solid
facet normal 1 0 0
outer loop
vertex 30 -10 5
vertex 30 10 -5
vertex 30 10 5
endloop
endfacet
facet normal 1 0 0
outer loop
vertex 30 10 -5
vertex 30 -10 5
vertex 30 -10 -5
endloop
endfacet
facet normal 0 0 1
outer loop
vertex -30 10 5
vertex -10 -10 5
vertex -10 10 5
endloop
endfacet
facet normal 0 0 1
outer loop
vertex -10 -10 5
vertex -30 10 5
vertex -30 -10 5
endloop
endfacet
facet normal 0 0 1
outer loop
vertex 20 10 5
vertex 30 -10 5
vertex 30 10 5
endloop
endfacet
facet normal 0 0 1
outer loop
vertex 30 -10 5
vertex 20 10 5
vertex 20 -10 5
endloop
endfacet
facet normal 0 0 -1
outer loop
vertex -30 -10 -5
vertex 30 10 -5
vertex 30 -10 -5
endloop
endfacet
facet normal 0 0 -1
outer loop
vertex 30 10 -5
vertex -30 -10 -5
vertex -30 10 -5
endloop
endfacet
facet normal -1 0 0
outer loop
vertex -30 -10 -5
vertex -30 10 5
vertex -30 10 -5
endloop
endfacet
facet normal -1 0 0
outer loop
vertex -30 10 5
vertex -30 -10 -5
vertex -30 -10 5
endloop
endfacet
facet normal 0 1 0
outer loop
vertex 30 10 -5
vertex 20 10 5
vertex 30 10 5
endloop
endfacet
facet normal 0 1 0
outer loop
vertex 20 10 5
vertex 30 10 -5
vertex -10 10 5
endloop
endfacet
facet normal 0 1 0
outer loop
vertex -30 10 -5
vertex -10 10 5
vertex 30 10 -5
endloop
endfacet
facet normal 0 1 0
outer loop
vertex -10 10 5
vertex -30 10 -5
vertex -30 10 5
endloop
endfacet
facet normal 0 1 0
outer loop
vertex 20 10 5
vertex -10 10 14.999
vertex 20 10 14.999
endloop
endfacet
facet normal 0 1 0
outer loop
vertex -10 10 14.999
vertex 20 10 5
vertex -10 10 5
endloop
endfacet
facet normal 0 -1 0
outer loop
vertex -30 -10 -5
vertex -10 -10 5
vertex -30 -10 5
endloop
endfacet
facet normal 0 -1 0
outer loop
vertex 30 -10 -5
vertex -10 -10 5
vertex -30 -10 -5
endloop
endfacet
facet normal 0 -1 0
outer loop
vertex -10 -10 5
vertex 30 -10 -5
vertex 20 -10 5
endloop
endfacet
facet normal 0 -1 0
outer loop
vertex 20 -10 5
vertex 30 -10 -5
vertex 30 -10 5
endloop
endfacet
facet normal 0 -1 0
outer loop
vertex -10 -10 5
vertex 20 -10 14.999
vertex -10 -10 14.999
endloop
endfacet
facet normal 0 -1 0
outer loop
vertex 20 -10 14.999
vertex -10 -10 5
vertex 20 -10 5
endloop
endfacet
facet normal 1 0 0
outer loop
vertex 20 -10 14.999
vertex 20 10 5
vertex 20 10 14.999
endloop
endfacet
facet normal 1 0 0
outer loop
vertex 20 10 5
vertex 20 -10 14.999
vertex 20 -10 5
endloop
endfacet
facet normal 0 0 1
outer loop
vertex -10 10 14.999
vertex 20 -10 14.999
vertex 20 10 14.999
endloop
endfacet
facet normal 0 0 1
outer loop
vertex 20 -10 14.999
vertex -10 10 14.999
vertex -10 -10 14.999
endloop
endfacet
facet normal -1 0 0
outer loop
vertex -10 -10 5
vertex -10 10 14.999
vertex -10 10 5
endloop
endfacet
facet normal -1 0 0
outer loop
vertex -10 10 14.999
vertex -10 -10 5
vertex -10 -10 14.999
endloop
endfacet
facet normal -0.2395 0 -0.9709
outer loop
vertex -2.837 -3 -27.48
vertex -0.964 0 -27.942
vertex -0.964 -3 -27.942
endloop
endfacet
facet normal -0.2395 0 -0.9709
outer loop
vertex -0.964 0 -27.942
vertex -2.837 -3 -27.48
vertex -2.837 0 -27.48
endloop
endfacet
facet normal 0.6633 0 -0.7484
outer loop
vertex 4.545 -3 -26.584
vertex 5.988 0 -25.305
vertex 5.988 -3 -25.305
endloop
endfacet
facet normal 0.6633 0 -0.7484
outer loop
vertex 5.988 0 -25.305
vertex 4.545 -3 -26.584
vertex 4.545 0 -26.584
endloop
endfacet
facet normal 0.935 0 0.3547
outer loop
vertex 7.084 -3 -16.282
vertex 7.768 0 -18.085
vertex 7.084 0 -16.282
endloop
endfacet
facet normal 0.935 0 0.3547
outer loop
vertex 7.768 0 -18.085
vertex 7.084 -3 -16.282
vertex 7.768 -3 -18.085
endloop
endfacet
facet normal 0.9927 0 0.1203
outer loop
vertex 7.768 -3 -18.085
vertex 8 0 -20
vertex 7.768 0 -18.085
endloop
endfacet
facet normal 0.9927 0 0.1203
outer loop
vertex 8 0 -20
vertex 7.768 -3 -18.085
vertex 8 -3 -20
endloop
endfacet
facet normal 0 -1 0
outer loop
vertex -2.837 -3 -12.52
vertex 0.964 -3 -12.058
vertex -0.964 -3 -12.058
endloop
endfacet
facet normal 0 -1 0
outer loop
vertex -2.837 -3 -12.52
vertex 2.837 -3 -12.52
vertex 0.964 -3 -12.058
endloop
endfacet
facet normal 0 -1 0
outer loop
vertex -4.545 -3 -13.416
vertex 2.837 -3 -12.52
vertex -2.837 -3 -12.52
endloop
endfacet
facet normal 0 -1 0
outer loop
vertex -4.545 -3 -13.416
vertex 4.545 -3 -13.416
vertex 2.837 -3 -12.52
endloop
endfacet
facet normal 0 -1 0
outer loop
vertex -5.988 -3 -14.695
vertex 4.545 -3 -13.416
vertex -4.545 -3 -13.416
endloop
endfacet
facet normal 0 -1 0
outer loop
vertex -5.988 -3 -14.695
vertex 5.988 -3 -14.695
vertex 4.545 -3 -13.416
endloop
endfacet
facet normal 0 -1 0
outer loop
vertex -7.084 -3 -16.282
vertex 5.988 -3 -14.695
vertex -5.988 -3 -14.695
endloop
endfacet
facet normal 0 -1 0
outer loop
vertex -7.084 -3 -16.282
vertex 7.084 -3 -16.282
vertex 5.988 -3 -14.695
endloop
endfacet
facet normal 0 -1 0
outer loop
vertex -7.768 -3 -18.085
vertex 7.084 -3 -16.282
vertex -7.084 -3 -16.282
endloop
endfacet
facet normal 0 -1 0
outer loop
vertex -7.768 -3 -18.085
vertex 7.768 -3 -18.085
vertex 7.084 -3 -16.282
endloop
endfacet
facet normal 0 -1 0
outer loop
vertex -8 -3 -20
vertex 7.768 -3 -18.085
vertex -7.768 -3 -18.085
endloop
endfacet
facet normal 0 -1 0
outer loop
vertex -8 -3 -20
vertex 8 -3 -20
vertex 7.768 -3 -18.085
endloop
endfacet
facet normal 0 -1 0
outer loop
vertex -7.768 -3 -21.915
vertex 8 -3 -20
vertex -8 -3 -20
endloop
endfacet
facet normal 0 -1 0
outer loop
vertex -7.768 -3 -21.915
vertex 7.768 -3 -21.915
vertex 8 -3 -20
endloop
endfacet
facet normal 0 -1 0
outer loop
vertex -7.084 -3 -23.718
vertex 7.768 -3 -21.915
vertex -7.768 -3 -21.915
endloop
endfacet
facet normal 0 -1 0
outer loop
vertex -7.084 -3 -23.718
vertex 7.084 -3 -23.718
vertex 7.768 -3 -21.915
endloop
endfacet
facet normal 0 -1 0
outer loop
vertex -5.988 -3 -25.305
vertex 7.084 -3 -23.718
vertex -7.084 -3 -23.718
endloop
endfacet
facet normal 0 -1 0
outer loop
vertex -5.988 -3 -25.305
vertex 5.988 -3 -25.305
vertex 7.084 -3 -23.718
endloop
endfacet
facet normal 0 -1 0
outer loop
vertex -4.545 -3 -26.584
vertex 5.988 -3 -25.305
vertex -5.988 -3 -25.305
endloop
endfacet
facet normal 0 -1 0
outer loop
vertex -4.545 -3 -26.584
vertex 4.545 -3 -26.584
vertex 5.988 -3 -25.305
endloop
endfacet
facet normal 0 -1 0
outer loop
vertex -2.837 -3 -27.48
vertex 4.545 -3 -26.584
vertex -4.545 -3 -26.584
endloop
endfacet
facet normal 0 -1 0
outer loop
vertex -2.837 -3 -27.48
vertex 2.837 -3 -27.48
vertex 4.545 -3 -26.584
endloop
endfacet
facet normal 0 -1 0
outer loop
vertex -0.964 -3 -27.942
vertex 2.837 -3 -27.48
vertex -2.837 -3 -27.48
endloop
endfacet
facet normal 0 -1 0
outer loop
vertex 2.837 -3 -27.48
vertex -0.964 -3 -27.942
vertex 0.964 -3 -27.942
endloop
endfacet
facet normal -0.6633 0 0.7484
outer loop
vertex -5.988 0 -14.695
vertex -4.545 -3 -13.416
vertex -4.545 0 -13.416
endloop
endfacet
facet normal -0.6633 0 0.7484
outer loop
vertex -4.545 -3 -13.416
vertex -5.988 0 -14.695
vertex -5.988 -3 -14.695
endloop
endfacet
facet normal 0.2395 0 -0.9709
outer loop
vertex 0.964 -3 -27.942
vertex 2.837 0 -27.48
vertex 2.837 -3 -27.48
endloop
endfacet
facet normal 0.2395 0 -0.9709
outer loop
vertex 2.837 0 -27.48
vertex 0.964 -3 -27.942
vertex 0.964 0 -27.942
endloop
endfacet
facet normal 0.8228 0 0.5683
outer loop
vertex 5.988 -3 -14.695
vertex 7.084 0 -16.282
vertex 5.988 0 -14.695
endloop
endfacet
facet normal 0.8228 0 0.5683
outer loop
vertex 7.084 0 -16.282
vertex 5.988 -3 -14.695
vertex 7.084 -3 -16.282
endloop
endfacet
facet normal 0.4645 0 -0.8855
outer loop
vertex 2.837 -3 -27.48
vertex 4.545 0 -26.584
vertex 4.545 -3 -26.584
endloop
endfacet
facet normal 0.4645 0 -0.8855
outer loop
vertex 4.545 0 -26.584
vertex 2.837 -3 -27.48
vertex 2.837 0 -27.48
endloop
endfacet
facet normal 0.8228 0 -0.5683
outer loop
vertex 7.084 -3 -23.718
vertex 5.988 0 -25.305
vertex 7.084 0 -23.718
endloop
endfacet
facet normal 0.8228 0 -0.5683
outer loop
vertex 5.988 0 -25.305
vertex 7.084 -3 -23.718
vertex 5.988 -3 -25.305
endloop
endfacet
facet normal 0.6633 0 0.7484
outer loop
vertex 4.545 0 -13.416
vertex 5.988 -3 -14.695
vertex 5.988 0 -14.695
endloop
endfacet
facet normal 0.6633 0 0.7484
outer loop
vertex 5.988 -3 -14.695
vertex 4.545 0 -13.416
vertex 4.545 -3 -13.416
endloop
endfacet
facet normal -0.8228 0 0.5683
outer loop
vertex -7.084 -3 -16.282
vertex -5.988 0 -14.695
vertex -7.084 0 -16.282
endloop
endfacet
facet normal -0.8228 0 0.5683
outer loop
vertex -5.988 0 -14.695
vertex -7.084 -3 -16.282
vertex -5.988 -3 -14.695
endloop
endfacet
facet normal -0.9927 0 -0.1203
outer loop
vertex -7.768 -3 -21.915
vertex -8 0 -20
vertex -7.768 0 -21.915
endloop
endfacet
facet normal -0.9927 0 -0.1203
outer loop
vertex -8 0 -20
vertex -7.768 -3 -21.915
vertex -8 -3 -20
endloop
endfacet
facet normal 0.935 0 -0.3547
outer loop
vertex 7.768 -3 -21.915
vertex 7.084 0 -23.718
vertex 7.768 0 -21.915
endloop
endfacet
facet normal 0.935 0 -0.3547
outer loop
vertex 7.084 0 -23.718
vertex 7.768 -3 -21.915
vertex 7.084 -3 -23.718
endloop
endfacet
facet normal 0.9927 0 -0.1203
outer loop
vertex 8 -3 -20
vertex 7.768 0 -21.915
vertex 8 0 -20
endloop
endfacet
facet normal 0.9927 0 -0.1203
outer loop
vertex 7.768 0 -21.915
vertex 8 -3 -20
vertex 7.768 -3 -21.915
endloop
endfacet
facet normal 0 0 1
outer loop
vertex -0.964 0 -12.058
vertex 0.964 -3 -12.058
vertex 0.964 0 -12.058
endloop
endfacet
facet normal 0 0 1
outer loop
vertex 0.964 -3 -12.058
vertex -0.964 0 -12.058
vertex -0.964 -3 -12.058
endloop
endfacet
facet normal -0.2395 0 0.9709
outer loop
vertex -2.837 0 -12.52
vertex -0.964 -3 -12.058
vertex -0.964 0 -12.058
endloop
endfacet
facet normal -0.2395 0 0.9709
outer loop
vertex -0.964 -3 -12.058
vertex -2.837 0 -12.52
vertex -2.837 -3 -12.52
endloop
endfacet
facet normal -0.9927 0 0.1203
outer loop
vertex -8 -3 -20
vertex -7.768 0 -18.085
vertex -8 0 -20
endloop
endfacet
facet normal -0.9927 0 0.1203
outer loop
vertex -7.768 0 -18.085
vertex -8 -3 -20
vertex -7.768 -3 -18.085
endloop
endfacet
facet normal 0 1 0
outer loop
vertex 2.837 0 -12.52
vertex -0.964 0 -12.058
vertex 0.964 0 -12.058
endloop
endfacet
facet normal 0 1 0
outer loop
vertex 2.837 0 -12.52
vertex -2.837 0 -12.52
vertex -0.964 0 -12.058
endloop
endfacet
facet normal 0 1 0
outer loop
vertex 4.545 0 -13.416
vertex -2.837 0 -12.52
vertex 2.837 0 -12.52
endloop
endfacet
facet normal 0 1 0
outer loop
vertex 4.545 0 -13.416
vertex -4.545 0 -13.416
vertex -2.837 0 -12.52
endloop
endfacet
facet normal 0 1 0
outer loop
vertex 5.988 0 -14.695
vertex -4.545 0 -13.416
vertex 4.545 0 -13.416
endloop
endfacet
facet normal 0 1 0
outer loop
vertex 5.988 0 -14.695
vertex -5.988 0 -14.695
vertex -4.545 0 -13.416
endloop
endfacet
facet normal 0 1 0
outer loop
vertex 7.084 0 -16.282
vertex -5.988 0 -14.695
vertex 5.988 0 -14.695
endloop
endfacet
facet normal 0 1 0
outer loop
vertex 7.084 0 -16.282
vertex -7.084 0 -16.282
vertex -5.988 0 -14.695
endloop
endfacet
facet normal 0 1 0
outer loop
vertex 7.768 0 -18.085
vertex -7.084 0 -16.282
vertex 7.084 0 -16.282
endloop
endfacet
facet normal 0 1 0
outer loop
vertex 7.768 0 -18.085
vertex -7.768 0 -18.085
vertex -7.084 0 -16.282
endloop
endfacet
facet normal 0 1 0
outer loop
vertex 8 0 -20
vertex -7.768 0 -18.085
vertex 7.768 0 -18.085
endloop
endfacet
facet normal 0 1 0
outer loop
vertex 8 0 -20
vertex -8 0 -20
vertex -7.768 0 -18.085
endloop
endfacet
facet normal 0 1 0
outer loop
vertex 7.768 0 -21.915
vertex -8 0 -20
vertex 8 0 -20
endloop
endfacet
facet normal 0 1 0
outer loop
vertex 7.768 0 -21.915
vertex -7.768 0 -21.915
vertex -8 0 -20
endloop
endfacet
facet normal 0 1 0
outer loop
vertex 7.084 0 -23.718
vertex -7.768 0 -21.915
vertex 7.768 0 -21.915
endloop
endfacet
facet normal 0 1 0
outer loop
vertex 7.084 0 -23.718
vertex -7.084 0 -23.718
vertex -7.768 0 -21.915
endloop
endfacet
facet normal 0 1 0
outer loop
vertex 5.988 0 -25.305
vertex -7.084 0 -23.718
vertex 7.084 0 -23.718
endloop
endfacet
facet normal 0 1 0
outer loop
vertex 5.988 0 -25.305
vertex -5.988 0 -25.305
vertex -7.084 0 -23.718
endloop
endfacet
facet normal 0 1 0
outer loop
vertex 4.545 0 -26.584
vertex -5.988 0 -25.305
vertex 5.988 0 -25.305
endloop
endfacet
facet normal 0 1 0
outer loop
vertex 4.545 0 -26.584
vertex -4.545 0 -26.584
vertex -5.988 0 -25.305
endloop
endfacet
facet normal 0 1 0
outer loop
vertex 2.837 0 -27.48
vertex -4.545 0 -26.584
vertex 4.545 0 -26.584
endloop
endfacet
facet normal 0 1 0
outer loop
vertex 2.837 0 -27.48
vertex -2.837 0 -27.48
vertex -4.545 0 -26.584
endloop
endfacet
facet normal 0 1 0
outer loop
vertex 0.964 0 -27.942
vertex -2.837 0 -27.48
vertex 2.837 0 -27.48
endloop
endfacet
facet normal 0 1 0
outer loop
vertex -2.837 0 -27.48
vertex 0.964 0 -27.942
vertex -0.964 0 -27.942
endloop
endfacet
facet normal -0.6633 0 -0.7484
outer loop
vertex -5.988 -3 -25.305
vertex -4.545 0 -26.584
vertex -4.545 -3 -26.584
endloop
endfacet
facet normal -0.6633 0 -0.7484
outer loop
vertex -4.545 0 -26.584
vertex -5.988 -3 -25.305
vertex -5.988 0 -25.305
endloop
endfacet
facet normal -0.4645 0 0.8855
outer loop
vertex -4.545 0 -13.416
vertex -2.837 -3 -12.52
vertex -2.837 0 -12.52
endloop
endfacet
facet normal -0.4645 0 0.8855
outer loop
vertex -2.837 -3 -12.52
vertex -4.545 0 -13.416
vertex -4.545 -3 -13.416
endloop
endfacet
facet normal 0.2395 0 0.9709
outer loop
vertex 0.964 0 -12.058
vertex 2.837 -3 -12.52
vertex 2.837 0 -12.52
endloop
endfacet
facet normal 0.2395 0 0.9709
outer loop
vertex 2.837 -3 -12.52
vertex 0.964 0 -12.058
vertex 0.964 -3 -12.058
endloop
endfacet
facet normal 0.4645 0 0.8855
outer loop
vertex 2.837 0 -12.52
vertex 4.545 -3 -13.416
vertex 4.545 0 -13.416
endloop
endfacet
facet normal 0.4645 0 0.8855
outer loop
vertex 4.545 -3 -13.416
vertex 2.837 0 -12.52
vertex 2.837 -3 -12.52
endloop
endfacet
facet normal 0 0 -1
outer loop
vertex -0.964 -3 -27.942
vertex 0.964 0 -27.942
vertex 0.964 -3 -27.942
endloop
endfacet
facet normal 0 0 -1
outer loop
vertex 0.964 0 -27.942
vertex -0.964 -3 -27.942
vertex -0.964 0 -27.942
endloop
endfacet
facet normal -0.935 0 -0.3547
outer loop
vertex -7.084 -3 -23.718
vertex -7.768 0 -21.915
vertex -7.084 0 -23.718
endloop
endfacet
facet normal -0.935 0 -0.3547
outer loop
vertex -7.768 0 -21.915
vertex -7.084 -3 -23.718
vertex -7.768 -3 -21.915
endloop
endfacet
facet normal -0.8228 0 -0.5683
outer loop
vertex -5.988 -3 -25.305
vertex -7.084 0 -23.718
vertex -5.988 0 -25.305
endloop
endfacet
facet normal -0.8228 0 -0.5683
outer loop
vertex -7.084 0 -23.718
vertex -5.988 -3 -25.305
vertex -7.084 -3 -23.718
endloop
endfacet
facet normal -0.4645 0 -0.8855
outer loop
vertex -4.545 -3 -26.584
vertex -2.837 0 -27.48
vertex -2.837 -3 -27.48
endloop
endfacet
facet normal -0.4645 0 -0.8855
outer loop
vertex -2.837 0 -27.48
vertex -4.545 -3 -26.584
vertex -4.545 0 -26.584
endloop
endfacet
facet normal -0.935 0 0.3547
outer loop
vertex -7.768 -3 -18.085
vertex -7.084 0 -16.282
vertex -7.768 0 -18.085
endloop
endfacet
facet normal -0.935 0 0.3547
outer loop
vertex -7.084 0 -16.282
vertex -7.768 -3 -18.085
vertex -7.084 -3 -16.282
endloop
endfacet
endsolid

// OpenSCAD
cube([60,20,10],center=true);
translate([5,0,10 - 0.001])
    cube([30,20,10],center=true);
rotate([90,0,0])
    translate([0,-20,0])
    cylinder(h=3,r=8);
